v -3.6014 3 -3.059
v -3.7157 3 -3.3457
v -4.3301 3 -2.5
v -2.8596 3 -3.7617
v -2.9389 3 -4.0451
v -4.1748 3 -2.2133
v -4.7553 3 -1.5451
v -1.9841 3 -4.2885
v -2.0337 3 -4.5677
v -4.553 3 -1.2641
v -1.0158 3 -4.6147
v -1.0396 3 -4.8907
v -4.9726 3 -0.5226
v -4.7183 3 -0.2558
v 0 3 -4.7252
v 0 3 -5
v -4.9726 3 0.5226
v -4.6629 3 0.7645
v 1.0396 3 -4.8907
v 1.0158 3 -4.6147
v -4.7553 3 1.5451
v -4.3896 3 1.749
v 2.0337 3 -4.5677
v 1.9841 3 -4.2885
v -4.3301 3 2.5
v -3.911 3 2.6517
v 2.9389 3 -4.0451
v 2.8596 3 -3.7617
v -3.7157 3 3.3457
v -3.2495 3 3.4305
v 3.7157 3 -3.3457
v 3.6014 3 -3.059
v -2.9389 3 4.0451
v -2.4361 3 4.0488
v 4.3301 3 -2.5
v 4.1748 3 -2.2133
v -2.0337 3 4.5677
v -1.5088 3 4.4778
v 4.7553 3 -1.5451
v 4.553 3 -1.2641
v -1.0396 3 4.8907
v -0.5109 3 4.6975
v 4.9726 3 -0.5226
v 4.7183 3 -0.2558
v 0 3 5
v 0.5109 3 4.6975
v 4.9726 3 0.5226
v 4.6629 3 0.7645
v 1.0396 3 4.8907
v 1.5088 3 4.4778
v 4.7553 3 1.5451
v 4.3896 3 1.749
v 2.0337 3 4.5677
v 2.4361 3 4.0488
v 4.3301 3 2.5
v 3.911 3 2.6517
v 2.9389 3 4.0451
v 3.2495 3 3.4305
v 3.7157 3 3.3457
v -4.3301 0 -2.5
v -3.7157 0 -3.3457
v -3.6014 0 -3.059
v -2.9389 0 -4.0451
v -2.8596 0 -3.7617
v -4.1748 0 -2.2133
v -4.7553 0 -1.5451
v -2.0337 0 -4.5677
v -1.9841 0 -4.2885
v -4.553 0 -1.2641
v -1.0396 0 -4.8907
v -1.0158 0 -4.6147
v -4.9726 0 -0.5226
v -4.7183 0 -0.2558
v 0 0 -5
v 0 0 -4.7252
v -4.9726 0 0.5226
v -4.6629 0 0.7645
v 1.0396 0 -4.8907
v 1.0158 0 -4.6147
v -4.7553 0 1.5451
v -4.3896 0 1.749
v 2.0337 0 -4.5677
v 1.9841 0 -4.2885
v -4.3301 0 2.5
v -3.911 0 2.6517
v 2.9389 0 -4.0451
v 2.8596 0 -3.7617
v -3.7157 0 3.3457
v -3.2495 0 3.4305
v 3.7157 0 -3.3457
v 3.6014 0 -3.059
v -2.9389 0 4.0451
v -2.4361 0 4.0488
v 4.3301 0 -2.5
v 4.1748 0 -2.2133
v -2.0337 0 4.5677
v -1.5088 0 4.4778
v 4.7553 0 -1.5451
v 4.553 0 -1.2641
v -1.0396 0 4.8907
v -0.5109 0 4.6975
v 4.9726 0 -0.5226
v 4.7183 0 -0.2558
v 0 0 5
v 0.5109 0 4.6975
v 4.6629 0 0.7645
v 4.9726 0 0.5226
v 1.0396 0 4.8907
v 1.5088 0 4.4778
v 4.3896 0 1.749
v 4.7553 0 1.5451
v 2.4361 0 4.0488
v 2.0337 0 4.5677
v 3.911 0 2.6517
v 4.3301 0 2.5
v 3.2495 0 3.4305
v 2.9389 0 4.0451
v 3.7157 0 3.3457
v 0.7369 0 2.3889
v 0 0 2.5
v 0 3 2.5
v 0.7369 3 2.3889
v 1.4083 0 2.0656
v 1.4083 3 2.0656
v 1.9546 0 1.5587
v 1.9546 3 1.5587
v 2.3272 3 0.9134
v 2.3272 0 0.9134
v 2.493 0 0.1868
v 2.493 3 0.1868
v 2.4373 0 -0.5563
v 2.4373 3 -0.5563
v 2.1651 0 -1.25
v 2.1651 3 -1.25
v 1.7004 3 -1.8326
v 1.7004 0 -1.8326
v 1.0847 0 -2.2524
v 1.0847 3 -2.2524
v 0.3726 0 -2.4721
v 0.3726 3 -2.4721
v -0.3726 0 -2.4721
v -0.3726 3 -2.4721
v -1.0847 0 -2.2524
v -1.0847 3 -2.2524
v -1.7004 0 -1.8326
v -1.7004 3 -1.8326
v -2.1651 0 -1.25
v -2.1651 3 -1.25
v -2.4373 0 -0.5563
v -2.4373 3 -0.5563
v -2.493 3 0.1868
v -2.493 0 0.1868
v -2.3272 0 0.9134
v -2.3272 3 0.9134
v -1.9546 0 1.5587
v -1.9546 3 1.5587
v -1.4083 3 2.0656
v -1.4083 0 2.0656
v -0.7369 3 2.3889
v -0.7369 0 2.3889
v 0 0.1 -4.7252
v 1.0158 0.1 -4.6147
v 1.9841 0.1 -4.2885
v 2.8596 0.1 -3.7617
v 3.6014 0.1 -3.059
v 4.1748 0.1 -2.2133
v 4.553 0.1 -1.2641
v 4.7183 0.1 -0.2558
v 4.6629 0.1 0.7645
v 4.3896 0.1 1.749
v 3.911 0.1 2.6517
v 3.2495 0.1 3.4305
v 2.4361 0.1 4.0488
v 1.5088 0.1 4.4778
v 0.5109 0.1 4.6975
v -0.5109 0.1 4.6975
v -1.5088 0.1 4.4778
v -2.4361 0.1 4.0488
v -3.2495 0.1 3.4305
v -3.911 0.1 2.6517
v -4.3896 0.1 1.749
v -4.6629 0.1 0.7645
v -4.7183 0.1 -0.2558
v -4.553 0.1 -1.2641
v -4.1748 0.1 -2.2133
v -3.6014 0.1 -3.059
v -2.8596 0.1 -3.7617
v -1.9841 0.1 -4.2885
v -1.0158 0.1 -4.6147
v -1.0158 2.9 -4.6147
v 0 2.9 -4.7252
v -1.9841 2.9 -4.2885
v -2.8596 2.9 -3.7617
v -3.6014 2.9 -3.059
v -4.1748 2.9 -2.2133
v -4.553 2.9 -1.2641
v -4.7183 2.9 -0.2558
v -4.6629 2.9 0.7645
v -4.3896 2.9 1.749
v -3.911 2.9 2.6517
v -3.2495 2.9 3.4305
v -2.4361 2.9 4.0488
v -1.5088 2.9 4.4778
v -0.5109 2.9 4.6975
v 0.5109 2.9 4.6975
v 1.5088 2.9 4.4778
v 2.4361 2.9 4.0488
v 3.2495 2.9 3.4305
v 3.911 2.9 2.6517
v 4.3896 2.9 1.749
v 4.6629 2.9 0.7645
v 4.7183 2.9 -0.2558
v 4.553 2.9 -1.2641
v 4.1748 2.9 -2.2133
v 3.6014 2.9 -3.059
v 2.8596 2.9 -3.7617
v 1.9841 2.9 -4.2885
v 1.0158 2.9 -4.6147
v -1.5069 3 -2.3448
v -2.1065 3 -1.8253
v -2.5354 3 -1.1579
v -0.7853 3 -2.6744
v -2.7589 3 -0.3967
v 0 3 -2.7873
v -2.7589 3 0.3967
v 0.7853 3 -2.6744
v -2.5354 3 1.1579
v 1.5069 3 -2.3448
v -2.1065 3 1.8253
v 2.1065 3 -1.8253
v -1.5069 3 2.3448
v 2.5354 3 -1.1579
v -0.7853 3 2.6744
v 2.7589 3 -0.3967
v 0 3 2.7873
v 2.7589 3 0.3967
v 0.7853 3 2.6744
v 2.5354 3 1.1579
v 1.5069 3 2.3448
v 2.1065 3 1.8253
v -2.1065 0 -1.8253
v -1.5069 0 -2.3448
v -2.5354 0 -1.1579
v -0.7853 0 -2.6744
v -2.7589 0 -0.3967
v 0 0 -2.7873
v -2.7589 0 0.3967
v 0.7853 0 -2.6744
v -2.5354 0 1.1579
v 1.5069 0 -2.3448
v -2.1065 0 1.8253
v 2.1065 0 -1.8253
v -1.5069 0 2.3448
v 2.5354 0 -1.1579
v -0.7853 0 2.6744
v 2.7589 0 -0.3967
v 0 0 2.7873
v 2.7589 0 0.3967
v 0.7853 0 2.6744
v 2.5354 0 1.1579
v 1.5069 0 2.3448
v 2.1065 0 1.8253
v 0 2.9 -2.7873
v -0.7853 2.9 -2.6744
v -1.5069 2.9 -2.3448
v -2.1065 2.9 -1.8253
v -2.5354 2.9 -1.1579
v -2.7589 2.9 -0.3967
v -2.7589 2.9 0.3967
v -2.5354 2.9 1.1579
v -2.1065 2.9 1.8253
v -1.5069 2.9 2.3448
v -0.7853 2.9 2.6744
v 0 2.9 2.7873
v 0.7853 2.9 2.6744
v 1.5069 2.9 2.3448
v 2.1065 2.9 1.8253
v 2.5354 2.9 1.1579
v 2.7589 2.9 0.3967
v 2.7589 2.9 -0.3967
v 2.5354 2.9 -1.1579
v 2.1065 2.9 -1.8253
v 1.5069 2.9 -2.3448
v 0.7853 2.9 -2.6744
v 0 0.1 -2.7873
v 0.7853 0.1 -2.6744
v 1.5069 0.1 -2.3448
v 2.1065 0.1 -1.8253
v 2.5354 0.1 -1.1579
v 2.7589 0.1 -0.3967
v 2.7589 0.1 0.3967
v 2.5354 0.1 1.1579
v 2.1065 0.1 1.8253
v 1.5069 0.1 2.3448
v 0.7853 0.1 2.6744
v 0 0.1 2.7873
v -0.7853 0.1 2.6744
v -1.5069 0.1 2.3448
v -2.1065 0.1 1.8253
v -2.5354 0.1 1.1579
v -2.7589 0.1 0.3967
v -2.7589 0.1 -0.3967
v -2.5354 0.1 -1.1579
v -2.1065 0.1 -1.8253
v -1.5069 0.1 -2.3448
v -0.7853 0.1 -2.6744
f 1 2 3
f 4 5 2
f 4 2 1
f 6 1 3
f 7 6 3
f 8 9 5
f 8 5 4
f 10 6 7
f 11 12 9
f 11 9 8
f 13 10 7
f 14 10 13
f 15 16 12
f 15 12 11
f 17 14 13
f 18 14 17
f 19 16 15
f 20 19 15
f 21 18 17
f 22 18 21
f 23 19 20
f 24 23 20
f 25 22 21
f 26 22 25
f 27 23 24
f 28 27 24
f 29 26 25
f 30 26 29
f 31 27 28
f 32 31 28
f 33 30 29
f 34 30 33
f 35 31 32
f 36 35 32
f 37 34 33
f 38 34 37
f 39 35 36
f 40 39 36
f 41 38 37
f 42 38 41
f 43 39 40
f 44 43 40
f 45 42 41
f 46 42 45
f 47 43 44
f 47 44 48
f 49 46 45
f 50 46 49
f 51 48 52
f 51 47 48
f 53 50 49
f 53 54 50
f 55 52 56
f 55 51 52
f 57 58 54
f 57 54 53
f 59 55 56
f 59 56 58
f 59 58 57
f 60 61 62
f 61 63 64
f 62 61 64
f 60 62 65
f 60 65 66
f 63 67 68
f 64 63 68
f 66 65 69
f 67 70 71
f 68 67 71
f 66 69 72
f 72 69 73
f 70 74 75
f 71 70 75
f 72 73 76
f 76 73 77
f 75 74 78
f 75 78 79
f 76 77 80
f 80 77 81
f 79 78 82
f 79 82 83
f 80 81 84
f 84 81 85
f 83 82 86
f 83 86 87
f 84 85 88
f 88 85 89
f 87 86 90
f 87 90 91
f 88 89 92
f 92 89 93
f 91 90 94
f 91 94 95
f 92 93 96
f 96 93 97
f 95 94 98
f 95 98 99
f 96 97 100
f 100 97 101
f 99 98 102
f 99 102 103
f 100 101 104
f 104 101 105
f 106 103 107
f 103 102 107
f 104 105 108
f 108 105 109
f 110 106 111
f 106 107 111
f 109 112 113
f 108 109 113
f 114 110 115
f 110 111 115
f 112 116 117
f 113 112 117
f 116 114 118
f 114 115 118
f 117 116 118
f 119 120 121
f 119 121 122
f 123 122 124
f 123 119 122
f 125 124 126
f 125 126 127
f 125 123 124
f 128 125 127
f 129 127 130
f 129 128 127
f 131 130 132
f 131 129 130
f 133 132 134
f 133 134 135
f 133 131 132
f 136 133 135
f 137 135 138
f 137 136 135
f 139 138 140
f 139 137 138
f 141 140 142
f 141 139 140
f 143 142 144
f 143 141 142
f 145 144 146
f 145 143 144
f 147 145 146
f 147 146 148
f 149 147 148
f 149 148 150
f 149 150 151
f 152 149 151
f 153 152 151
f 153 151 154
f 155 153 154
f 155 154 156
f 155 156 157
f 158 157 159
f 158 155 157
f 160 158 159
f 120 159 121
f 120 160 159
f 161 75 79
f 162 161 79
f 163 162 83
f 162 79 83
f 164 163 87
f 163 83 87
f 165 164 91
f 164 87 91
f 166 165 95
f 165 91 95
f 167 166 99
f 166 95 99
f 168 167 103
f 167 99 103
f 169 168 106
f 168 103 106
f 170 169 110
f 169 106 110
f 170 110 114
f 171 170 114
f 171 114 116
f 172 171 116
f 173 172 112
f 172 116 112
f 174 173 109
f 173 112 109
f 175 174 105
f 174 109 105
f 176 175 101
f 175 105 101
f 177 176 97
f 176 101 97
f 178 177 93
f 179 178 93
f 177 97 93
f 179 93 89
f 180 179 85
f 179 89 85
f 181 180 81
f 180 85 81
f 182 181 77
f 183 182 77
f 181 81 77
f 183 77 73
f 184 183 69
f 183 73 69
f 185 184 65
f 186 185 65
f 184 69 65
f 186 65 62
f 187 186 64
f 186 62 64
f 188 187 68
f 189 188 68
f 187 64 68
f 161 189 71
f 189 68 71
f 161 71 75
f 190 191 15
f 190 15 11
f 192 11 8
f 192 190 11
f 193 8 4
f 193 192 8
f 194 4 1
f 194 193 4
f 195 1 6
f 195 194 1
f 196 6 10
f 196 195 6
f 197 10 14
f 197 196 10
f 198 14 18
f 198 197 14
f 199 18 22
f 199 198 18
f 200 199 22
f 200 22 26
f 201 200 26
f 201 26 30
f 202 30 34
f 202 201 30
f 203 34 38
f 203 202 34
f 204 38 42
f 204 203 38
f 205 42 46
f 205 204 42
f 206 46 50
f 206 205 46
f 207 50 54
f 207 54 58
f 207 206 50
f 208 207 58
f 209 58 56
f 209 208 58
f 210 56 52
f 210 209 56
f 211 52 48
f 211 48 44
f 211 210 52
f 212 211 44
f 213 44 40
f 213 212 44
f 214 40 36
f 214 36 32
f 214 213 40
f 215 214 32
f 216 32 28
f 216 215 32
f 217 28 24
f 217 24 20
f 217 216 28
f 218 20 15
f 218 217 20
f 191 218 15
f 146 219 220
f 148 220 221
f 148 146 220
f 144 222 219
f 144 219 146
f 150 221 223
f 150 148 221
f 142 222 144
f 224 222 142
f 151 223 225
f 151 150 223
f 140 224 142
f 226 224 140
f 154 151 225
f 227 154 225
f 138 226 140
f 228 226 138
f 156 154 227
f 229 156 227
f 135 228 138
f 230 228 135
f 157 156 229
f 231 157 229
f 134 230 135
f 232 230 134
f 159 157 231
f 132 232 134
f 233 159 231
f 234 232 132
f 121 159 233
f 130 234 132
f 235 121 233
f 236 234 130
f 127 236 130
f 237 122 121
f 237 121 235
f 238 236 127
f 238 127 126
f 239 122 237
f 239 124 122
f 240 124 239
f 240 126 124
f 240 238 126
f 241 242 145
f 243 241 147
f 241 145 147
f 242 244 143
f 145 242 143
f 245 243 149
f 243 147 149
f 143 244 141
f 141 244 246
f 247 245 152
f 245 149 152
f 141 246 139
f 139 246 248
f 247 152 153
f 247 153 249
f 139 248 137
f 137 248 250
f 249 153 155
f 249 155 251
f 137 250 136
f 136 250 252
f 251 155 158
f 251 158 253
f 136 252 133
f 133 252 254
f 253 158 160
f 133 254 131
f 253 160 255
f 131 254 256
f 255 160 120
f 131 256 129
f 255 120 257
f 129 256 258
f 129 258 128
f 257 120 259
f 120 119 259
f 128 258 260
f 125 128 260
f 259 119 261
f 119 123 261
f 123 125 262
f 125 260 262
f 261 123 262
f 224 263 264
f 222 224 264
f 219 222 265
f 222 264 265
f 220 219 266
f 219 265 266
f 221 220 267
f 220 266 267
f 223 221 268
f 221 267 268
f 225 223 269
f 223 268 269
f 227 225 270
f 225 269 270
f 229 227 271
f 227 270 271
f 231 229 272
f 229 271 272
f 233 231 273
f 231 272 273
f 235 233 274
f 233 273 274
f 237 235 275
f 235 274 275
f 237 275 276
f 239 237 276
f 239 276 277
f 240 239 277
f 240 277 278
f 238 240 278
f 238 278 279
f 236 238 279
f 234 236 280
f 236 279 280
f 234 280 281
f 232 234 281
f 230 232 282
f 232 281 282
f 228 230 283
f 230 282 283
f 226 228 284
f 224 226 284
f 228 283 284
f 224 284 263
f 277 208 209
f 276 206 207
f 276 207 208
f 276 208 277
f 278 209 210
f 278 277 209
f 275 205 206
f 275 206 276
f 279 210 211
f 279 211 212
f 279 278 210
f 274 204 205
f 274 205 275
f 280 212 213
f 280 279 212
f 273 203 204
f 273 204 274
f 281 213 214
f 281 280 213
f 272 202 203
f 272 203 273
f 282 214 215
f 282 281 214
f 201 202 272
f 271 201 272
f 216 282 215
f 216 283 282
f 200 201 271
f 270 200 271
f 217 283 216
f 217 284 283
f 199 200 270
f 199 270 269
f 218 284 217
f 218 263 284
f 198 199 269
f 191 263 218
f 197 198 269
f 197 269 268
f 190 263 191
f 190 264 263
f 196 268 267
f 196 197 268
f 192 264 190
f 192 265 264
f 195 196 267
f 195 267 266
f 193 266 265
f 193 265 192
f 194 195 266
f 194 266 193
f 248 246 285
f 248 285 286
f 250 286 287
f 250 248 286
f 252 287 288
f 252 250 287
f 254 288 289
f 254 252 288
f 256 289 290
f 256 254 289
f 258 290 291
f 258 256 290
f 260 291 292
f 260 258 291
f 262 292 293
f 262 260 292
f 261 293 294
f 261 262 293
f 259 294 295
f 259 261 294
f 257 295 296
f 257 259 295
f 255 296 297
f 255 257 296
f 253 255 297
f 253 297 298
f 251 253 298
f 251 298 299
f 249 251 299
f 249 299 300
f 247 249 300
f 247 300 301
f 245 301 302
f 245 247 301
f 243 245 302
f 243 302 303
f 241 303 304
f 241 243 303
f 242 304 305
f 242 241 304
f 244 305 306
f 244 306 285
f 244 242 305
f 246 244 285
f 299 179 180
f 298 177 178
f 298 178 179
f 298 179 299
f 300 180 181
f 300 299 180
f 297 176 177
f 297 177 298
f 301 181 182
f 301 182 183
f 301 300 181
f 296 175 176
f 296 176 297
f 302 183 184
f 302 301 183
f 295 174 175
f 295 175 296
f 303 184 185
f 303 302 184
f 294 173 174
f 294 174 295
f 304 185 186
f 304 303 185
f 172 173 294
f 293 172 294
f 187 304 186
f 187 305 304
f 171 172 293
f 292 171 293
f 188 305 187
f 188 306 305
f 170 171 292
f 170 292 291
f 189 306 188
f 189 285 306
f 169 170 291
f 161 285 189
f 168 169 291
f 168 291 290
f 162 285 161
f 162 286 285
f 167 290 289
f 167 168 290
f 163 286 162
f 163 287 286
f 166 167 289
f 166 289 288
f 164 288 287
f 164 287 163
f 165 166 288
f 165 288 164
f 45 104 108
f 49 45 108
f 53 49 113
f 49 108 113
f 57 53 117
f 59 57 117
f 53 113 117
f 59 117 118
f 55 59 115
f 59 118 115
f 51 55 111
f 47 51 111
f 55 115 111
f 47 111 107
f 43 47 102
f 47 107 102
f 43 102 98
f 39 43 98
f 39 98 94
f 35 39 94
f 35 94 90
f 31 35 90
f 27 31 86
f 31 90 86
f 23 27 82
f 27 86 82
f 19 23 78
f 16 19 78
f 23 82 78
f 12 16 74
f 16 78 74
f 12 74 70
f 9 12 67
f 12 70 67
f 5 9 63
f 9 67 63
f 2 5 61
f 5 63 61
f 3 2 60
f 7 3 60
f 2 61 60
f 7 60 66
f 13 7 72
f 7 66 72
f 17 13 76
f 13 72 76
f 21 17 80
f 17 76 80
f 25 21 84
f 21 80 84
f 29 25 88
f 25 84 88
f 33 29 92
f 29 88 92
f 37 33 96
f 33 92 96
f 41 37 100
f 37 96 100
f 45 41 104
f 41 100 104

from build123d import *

# Parameters (mm, degrees)
SKETCH1_R           = 5
SKETCH1_R_2         = 2.5
BOSS_EXTRUDE1_DEPTH = 3
SKETCH2_R           = 4.725189579
SKETCH2_R_2         = 2.787282072
CUT_EXTRUDE1_DEPTH  = 0.1
CUT_EXTRUDE2_START  = -0.1
SKETCH3_R           = 4.725189579
SKETCH3_R_2         = 2.787282072
CUT_EXTRUDE2_DEPTH  = 0.1


with BuildPart() as part:
    # Sketch1 → Boss-Extrude1 (new body)
    with BuildSketch(Plane(origin=(0, 0, 0), x_dir=(1, 0, 0), z_dir=(0, 1, 0))):
        with Locations(Location((0, 0, 0), (0, 0, 270))):
            Circle(SKETCH1_R)
        with Locations(Location((0, 0, 0), (0, 0, 270))):
            Circle(SKETCH1_R_2, mode=Mode.SUBTRACT)
    extrude(amount=BOSS_EXTRUDE1_DEPTH)

    # Sketch2 → Cut-Extrude1 (cut)
    with BuildSketch(Plane.XZ):
        with Locations(Location((0, 0, 0), (0, 0, 270))):
            Circle(SKETCH2_R)
        with Locations(Location((0, 0, 0), (0, 0, 270))):
            Circle(SKETCH2_R_2, mode=Mode.SUBTRACT)
    extrude(amount=-CUT_EXTRUDE1_DEPTH, mode=Mode.SUBTRACT)

    # Sketch3 → Cut-Extrude2 (cut)
    with BuildSketch(Plane(origin=(0, 3, 0), x_dir=(1, 0, 0), z_dir=(0, 1, 0)).offset(CUT_EXTRUDE2_START)):
        with Locations(Location((0, 0, 0), (0, 0, 90))):
            Circle(SKETCH3_R)
        with Locations(Location((0, 0, 0), (0, 0, 90))):
            Circle(SKETCH3_R_2, mode=Mode.SUBTRACT)
    extrude(amount=CUT_EXTRUDE2_DEPTH, mode=Mode.SUBTRACT)


solid = part.part
